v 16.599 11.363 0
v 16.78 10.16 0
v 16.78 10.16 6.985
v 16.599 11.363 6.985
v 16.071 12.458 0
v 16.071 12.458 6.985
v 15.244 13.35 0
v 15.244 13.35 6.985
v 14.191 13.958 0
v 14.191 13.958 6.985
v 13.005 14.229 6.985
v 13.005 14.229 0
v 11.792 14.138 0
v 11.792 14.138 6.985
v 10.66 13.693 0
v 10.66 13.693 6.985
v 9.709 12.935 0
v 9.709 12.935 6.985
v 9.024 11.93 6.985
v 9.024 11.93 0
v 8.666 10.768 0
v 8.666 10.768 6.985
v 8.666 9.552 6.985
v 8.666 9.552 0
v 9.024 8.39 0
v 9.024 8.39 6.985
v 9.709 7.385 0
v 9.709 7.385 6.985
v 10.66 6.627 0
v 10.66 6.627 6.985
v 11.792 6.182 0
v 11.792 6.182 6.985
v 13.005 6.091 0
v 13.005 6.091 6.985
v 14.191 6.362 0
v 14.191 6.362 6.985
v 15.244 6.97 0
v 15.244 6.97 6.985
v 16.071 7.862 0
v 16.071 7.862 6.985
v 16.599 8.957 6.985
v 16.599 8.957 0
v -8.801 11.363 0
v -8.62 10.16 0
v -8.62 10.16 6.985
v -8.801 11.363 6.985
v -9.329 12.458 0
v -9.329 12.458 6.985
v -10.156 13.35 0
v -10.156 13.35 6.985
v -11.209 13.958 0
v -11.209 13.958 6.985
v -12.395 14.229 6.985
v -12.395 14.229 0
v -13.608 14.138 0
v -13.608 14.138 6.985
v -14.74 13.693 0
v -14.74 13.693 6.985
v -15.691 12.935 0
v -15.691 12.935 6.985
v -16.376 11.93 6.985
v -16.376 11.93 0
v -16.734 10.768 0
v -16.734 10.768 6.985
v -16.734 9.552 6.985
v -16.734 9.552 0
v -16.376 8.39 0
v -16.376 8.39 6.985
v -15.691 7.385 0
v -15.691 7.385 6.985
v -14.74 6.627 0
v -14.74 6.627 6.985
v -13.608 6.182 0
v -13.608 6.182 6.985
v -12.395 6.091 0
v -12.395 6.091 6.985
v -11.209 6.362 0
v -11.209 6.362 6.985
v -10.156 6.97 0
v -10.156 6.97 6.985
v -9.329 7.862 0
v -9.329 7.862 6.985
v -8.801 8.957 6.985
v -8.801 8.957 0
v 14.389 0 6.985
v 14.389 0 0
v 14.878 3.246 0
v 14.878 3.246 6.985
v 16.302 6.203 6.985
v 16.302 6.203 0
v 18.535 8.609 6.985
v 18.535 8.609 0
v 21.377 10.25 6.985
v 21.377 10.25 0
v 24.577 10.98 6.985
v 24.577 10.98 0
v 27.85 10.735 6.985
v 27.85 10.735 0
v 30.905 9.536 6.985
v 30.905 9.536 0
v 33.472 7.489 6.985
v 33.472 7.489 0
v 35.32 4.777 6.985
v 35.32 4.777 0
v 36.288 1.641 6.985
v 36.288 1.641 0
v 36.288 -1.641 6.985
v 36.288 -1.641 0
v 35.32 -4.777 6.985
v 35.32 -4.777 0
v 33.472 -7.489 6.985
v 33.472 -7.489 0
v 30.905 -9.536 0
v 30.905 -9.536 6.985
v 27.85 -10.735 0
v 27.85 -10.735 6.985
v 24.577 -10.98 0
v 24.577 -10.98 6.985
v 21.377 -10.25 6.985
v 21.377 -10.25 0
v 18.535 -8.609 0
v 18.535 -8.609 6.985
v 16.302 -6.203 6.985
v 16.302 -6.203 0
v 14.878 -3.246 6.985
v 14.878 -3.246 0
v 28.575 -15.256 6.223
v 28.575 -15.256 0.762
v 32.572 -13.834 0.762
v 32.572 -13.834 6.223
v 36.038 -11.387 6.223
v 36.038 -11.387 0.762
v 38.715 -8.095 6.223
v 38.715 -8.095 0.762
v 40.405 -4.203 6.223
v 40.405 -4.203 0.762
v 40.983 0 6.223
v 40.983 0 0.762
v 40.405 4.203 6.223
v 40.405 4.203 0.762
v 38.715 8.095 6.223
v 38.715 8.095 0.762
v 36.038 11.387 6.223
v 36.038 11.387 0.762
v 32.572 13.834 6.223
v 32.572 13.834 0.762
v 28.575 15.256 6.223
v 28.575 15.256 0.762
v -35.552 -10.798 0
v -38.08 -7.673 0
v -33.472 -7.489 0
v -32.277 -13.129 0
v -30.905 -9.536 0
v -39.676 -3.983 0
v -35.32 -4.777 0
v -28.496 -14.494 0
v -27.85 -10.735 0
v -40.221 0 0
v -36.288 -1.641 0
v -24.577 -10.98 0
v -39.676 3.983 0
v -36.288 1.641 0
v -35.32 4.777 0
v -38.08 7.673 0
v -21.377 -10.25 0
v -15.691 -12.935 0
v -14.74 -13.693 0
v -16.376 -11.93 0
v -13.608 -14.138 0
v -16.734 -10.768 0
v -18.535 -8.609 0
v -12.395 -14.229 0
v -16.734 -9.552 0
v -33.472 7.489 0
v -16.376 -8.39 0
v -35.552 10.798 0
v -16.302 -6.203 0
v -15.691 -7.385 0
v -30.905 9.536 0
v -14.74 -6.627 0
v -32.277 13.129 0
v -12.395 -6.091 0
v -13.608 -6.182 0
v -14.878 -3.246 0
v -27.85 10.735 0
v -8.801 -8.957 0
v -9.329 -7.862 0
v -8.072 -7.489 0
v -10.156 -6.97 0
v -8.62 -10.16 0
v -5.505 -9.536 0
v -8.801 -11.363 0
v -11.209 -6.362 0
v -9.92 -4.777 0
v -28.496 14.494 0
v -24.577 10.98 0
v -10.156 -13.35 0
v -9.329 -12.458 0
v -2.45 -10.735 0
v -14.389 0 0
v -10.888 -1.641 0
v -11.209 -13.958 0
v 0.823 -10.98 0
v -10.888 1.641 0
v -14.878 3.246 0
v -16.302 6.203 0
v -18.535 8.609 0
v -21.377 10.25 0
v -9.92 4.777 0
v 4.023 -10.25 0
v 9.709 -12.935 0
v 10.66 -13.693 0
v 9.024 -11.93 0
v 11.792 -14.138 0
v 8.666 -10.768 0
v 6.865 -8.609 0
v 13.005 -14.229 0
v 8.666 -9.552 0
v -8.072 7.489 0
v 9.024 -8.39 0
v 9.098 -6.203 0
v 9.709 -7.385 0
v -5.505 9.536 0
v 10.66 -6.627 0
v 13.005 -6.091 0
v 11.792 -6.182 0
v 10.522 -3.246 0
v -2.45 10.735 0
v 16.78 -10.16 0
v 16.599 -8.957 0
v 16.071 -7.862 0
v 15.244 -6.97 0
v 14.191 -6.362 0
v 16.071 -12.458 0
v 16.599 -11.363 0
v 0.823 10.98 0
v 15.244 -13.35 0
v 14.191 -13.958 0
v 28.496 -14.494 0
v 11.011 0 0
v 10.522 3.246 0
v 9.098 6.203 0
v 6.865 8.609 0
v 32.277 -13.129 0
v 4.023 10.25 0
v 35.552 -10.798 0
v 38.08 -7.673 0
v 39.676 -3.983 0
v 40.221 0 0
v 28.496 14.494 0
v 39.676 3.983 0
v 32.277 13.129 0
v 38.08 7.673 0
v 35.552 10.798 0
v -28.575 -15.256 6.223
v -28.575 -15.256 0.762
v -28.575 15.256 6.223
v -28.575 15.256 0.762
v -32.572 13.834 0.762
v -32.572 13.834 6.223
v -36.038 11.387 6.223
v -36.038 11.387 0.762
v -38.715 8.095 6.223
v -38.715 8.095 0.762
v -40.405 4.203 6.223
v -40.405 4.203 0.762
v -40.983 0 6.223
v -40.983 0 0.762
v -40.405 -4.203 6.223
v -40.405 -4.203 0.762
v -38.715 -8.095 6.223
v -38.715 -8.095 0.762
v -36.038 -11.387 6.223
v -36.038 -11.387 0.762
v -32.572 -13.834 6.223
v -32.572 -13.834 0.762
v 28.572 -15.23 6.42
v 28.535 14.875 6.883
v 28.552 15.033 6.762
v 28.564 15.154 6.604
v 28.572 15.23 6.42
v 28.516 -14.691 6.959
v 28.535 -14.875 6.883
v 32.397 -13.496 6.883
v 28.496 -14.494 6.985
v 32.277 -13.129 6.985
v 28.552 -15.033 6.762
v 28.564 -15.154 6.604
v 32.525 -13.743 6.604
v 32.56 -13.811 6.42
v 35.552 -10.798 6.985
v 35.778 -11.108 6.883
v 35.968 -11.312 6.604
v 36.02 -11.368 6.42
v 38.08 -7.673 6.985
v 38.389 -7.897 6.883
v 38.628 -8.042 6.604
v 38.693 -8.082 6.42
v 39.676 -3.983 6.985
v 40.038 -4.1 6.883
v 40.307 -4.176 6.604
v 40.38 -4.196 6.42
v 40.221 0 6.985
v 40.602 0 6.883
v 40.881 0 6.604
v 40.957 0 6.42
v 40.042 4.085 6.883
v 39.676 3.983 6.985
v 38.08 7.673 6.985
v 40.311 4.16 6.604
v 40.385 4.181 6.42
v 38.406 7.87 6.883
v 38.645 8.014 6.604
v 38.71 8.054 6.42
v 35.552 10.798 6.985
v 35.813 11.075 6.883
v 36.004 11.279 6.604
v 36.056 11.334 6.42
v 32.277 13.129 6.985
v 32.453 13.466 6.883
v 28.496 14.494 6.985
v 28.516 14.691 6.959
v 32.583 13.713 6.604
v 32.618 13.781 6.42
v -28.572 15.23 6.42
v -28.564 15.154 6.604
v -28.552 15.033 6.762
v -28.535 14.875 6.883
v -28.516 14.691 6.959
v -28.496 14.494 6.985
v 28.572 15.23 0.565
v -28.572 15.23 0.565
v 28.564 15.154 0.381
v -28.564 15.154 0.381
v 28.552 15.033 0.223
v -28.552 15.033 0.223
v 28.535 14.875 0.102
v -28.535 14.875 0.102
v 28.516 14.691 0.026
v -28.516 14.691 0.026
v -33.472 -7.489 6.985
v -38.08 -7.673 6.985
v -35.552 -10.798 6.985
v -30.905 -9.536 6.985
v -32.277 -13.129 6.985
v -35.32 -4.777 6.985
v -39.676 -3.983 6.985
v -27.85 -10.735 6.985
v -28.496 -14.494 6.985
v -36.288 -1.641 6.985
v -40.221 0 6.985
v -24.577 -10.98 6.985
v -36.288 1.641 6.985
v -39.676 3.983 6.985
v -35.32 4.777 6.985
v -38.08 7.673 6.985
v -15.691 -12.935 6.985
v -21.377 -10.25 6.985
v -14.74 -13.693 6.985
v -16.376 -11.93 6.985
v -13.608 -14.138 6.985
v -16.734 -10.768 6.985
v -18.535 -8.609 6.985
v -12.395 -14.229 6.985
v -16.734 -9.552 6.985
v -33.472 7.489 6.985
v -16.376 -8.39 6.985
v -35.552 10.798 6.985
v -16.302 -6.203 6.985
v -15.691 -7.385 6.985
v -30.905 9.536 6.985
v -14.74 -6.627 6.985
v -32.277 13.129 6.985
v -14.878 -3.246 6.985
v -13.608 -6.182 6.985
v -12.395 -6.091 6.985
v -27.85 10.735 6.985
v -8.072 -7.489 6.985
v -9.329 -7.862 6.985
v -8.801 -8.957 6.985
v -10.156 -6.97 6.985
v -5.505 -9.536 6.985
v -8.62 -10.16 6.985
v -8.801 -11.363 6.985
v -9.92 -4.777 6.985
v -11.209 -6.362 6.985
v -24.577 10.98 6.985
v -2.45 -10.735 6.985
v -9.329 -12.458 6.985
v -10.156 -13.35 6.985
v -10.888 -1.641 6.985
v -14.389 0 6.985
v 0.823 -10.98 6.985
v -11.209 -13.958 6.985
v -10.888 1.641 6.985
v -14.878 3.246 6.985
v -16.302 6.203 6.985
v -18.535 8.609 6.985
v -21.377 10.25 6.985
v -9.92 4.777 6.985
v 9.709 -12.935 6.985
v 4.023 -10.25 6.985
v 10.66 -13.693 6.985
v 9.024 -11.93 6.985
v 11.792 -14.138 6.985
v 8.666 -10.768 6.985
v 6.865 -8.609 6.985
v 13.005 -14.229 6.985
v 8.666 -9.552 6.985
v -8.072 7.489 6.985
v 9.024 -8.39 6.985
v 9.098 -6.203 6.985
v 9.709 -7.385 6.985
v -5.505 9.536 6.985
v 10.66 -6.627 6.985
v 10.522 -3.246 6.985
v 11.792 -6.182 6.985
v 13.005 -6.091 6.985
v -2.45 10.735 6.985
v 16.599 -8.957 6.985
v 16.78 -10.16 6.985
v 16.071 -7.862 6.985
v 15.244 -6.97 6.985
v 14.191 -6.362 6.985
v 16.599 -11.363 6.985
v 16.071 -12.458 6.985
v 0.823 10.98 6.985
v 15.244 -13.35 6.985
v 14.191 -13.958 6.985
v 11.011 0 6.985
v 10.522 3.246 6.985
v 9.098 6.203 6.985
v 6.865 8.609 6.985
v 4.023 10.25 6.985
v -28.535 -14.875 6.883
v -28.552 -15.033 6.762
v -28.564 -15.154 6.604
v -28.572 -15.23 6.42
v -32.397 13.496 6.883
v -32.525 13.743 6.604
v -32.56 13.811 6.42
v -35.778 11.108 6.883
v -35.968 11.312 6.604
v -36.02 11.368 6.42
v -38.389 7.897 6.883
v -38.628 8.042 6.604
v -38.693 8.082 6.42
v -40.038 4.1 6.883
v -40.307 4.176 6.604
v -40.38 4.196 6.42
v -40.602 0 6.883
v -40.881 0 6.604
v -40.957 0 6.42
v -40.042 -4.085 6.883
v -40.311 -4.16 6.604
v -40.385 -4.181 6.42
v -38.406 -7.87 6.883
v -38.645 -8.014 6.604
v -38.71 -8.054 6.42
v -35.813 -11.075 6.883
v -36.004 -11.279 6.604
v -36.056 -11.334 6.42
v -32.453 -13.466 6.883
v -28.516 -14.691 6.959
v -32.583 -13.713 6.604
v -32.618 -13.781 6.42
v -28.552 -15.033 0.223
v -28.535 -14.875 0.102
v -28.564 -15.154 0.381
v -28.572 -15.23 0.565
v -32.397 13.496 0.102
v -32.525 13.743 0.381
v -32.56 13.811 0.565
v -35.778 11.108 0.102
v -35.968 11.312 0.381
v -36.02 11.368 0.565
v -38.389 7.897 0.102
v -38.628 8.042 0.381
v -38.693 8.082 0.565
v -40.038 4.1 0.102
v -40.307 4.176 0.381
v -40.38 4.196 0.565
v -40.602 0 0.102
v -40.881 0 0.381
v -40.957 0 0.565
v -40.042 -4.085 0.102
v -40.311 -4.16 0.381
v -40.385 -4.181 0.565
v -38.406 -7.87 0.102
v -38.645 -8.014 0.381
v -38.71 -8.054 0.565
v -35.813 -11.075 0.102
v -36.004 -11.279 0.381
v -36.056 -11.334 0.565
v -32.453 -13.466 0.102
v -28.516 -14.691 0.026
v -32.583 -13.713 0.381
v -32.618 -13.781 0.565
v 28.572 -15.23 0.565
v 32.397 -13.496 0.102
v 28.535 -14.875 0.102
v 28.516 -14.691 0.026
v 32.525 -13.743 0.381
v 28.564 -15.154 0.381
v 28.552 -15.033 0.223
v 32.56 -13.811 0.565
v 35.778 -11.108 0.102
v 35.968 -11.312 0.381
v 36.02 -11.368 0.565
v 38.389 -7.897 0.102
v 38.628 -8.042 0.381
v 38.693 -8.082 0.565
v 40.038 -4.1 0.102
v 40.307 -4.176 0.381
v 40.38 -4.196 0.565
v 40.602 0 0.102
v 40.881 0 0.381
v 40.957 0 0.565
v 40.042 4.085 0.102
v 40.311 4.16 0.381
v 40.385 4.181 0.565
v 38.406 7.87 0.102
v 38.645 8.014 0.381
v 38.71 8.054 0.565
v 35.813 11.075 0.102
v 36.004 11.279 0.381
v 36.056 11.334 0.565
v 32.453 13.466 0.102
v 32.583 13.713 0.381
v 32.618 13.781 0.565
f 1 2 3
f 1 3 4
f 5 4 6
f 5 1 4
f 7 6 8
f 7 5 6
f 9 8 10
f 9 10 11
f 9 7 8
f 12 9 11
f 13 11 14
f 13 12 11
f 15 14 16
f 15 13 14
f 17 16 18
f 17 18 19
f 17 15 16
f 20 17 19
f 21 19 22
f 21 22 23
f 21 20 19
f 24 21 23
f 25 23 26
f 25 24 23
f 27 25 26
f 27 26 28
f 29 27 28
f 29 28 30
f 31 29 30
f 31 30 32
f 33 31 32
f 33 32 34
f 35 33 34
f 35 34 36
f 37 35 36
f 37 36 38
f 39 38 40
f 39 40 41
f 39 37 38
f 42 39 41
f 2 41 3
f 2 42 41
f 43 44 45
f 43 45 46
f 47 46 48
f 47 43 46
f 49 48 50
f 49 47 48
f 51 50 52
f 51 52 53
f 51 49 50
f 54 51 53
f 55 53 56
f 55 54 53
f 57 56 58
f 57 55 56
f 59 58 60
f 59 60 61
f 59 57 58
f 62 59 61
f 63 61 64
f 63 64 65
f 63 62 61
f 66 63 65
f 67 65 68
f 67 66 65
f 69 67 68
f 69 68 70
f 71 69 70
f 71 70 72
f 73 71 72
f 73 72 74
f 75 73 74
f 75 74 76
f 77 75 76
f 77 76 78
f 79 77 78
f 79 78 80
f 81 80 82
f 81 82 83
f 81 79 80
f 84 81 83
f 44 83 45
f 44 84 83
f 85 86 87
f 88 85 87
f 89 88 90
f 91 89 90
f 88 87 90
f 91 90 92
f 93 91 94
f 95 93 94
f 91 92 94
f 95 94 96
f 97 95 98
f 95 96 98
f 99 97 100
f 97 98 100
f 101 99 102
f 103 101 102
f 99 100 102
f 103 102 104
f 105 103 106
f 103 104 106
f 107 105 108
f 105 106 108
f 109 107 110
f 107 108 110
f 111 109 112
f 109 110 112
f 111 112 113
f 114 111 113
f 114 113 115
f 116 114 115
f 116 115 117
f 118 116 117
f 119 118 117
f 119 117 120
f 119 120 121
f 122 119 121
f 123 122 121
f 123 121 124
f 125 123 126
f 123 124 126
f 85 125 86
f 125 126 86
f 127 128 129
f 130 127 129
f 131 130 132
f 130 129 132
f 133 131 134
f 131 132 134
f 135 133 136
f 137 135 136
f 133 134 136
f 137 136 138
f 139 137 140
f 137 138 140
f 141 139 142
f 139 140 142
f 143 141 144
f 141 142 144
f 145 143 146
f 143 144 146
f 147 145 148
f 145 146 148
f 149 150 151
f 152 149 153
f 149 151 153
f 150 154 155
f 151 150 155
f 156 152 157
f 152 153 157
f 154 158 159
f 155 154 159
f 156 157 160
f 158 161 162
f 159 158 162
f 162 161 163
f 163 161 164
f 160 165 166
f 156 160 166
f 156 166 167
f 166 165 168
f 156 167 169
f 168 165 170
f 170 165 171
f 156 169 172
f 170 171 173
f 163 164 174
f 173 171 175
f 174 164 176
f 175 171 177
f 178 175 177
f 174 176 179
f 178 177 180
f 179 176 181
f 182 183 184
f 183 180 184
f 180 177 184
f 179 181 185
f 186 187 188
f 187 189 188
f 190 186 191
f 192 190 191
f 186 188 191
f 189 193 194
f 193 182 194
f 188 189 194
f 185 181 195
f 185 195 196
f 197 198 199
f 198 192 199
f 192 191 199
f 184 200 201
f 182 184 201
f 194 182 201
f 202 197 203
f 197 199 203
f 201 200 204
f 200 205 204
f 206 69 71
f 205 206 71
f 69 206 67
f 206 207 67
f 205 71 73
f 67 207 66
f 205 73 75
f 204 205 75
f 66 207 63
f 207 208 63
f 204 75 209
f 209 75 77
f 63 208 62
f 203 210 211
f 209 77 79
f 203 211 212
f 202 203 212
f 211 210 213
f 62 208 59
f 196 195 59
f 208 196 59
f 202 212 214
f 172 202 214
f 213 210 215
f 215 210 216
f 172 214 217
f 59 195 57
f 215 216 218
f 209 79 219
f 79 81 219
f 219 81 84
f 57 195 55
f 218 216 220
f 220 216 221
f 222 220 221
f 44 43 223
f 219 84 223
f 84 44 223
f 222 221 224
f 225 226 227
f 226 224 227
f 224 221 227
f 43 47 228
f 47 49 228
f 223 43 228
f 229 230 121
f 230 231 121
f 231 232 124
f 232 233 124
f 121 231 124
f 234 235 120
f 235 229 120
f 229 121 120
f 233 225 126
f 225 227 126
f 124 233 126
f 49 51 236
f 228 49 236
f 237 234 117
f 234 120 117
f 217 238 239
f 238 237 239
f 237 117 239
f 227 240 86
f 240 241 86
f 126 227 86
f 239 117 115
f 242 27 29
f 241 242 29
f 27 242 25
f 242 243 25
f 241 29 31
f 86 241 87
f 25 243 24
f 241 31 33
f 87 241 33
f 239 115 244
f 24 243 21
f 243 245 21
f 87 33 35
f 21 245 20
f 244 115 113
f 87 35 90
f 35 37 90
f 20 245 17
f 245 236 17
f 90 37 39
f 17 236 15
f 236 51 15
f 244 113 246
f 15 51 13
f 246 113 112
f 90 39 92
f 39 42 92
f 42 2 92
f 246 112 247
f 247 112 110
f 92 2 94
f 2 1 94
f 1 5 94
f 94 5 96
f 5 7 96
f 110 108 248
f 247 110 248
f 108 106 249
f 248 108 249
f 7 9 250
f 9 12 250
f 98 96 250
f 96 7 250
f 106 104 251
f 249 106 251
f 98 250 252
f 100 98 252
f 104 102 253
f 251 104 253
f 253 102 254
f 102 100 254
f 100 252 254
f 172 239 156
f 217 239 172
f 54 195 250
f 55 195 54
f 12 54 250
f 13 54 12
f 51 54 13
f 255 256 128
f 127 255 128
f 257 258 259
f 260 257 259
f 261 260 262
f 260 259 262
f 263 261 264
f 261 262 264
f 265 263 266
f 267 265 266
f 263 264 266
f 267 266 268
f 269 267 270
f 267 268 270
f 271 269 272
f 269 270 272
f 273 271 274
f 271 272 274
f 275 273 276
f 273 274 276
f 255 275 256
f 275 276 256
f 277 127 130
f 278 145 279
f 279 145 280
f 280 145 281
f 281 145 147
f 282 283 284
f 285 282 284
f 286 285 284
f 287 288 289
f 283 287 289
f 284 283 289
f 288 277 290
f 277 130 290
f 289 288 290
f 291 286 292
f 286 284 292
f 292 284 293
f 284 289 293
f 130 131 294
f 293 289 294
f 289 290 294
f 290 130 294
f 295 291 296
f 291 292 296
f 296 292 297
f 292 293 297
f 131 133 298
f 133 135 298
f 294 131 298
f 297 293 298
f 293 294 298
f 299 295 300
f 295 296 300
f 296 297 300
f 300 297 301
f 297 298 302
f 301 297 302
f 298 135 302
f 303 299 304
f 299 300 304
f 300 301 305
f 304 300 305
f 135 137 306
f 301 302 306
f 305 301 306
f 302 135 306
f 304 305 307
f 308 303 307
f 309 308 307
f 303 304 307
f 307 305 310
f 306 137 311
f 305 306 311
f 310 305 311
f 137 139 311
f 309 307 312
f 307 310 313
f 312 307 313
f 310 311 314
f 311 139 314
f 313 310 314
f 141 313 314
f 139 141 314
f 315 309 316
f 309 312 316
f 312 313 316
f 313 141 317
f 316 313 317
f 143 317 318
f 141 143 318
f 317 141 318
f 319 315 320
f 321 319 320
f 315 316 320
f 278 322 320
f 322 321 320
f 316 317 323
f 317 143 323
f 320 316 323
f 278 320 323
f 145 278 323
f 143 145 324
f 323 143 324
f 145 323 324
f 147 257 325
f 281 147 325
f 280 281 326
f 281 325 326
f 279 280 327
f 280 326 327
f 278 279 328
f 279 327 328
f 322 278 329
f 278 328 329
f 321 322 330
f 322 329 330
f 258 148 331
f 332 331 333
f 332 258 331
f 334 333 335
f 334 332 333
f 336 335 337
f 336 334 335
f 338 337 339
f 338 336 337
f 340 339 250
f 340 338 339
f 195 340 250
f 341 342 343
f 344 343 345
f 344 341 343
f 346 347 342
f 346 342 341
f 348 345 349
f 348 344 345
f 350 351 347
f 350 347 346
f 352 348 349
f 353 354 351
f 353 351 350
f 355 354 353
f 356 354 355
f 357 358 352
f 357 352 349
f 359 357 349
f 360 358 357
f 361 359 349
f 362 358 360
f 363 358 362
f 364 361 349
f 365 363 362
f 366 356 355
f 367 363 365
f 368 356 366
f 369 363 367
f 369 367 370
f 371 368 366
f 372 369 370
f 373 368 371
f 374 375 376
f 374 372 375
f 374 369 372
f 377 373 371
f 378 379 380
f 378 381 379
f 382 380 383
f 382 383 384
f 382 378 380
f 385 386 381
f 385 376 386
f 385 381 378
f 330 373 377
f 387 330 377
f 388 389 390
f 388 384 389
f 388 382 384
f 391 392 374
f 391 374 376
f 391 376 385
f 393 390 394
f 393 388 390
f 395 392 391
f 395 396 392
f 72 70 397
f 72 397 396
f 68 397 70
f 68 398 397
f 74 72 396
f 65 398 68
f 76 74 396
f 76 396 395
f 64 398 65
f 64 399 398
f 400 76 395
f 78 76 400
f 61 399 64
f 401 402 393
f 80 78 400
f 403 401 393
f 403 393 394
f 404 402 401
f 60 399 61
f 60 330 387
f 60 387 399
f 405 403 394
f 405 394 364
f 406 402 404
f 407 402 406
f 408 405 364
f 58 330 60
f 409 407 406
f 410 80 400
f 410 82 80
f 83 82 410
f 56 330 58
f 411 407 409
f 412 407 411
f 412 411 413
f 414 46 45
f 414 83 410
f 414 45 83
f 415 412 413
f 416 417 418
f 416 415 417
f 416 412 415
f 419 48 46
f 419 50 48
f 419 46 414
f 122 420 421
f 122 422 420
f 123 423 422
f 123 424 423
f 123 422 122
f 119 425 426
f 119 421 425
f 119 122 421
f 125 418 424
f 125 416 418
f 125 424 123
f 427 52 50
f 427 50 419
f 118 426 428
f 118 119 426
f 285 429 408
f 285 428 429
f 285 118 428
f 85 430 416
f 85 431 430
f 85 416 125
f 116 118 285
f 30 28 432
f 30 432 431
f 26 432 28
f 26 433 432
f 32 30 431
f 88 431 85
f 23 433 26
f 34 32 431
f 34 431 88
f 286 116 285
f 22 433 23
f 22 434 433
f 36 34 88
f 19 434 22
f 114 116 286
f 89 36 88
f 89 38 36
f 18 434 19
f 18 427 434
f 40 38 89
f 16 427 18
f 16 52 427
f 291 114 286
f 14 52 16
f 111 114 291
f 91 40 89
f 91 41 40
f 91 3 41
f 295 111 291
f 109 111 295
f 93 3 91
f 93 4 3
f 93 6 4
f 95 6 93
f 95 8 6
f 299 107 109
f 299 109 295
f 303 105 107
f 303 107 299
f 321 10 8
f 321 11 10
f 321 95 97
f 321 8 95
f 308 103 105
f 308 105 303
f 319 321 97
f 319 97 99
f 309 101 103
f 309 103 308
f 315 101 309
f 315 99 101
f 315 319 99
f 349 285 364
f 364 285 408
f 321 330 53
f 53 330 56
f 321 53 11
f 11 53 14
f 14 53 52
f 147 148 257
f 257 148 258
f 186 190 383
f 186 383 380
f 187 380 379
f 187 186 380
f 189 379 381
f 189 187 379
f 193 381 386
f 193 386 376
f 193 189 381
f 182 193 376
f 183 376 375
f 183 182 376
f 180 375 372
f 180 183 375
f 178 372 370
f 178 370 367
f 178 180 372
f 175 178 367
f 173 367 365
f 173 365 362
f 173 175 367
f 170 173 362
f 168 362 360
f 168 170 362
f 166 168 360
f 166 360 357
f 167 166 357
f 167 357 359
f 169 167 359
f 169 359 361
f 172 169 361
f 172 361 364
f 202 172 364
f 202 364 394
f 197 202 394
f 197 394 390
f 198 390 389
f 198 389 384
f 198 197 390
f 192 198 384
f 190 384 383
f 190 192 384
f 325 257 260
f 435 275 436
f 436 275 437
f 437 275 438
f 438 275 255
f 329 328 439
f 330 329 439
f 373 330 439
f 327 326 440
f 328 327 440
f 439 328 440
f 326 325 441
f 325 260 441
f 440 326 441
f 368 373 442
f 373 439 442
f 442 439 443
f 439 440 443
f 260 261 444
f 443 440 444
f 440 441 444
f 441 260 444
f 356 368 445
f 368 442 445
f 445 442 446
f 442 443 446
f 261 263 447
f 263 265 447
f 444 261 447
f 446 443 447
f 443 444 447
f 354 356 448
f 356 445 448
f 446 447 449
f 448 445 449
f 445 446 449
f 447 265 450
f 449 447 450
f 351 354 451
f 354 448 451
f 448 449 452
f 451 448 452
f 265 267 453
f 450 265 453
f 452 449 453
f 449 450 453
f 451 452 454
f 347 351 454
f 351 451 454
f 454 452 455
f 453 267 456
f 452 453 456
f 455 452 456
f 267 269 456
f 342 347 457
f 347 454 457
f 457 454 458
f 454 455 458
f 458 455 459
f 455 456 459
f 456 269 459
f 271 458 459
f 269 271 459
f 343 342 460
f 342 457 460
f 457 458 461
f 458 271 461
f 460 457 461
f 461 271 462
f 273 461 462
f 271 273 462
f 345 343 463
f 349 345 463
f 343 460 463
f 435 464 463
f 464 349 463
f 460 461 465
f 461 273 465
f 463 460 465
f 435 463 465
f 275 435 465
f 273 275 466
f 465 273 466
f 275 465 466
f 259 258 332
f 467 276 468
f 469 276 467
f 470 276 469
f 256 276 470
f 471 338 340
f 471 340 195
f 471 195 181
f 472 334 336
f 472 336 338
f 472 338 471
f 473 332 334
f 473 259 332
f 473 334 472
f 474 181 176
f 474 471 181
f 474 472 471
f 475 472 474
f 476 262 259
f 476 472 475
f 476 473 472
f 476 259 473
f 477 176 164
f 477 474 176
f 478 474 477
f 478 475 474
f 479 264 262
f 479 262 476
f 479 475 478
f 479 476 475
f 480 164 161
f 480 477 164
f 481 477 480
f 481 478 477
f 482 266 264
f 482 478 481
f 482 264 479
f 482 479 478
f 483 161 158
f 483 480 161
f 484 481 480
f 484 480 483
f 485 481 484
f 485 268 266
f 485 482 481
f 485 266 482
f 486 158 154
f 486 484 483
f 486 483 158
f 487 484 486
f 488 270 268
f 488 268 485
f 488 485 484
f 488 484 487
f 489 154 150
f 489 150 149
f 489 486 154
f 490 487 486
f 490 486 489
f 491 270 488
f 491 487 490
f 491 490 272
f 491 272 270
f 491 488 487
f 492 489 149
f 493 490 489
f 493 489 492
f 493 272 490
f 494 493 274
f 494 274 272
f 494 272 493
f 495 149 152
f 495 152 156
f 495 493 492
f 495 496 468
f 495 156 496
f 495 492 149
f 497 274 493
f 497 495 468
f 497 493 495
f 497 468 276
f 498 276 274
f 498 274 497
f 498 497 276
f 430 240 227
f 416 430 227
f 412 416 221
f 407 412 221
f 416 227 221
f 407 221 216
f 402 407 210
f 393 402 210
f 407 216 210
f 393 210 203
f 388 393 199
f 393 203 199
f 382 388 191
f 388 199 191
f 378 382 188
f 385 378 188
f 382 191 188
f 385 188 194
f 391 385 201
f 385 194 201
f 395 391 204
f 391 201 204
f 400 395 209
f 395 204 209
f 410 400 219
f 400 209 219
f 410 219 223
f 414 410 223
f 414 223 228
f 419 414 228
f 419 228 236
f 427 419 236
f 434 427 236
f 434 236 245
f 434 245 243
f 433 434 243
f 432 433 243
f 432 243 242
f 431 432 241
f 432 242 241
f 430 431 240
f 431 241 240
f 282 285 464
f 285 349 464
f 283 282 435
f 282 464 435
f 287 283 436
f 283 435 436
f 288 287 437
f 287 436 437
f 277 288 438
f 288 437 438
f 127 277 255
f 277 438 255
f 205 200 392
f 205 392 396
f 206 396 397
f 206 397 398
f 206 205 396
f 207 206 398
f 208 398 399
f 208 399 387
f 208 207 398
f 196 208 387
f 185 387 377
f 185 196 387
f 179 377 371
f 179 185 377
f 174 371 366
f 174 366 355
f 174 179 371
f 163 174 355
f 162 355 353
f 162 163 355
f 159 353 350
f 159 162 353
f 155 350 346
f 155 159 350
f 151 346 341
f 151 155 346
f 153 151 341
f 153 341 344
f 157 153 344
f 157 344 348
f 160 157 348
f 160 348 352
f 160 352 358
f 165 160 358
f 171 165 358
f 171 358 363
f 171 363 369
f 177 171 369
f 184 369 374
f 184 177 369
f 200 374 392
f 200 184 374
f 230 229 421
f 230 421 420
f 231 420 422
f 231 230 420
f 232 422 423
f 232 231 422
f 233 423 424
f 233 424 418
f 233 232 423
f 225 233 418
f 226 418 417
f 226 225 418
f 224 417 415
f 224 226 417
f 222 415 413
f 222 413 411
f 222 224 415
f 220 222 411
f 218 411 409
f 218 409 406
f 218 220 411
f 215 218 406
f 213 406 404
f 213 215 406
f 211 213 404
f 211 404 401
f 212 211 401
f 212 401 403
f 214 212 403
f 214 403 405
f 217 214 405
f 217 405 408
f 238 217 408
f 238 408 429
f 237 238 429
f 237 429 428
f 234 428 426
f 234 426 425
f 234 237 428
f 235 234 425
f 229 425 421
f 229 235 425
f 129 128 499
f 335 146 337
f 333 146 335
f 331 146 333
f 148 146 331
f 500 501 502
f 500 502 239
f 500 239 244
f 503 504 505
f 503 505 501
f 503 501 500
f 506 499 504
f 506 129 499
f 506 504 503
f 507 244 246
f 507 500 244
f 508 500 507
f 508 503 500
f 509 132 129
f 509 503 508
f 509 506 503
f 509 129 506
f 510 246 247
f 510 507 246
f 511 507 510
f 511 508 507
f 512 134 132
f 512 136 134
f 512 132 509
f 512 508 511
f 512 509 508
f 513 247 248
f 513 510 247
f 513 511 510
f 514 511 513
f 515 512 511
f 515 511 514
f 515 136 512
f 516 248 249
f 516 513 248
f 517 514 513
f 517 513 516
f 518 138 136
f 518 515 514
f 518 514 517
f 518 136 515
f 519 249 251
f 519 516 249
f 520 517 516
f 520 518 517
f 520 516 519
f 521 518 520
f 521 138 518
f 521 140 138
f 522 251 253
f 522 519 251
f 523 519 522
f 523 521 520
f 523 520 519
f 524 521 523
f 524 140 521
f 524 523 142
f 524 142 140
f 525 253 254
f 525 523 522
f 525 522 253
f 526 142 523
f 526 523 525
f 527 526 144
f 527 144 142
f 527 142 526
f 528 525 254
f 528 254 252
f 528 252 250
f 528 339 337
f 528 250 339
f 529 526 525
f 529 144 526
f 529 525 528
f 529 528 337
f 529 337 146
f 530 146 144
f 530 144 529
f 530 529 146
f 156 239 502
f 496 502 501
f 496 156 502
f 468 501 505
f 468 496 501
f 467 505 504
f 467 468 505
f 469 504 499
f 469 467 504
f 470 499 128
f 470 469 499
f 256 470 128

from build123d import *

# Parameters (mm, degrees)
F0_R        = 4.0800200383
F0_R_2      = 11.0109
F1_DEPTH    = 6.985
F2_T1_DEPTH = 63.627
F2_T4_ANGLE = 170.5132200492
F2_T6_ANGLE = 170.5132200492
F3_T1_DEPTH = 63.627
F3_T4_ANGLE = 170.5132200492
F3_T6_ANGLE = 170.5132200492


# Not quite as in the source:
# - a fillet or chamfer that OpenCascade refuses, or shapes differently, is made with other operations: its cross-section is extruded or revolved along the edge and cut away or added


with BuildPart() as f1:
    # F0 (on Top) → F1 (new body)
    with BuildSketch(Plane.XY):
        with BuildLine():
            Line((28.575, 15.2560200383), (-28.575, 15.2560200383))
            ThreePointArc((-28.575, 15.2560200383), (-40.9829, 0), (-28.575, -15.2560200383))
            Line((-28.575, -15.2560200383), (28.575, -15.2560200383))
            ThreePointArc((28.575, -15.2560200383), (40.9829, 0), (28.575, 15.2560200383))
        make_face()
        with Locations((-12.7, -10.16)):
            Circle(F0_R, mode=Mode.SUBTRACT)
        with Locations((12.7, -10.16)):
            Circle(F0_R, mode=Mode.SUBTRACT)
        with Locations((-25.4, 0)):
            Circle(F0_R_2, mode=Mode.SUBTRACT)
        with Locations((-12.7, 10.16)):
            Circle(F0_R, mode=Mode.SUBTRACT)
        with BuildLine():
            ThreePointArc((-11.0109, 0), (0, 11.0109), (11.0109, 0))
            ThreePointArc((11.0109, 0), (0, -11.0109), (-11.0109, 0))
        make_face(mode=Mode.SUBTRACT)
        with BuildLine():
            ThreePointArc((36.4109, 0), (25.4, -11.0109), (14.3891, 0))
            ThreePointArc((14.3891, 0), (25.4, 11.0109), (36.4109, 0))
        make_face(mode=Mode.SUBTRACT)
        with Locations((12.7, 10.16)):
            Circle(F0_R, mode=Mode.SUBTRACT)
    extrude(amount=F1_DEPTH)

    # F2: fillet of radius 0.762 on 4 edges, made by hand

    # F2_s2 → F2_t1 (cut)
    with BuildSketch(Plane.YZ.offset(-31.8135)):
        with BuildLine():
            ThreePointArc((-14.4940200383, 6.985), (-15.0328354056, 6.7618153673), (-15.2560200383, 6.223))
            Line((-15.2560200383, 6.223), (-15.2560200383, 6.985))
            Line((-15.2560200383, 6.985), (-14.4940200383, 6.985))
        make_face()
        with BuildLine():
            ThreePointArc((15.2560200383, 6.223), (15.0328354056, 6.7618153673), (14.4940200383, 6.985))
            Line((14.4940200383, 6.985), (15.2560200383, 6.985))
            Line((15.2560200383, 6.985), (15.2560200383, 6.223))
        make_face()
    extrude(amount=F2_T1_DEPTH, mode=Mode.SUBTRACT)

    # F2_s3 → F2_t4 (revolve, cut)
    with BuildSketch(Plane(origin=(-25.2263104474, -2.0932144122, 0), x_dir=(0, 0, 1), z_dir=(0.9965750492, 0.0826932365, 0))):
        with BuildLine():
            ThreePointArc((6.985, -16.921308207), (6.7618153673, -17.4601235742), (6.223, -17.683308207))
            Line((6.223, -17.683308207), (6.985, -17.683308207))
            Line((6.985, -17.683308207), (6.985, -16.921308207))
        make_face()
    revolve(axis=Axis((-25.4, 0, 6.985), (0, 0, 1)), revolution_arc=F2_T4_ANGLE, mode=Mode.SUBTRACT)

    # F2_s5 → F2_t6 (revolve, cut)
    with BuildSketch(Plane(origin=(25.2263104474, 2.0932144122, 0), x_dir=(0, 0, 1), z_dir=(-0.9965750492, -0.0826932365, 0))):
        with BuildLine():
            ThreePointArc((6.985, -16.921308207), (6.7618153673, -17.4601235742), (6.223, -17.683308207))
            Line((6.223, -17.683308207), (6.985, -17.683308207))
            Line((6.985, -17.683308207), (6.985, -16.921308207))
        make_face()
    revolve(axis=Axis((25.4, 0, 6.985), (0, 0, 1)), revolution_arc=F2_T6_ANGLE, mode=Mode.SUBTRACT)

    # F3: fillet of radius 0.762 on 4 edges, made by hand

    # F3_s2 → F3_t1 (cut)
    with BuildSketch(Plane.YZ.offset(-31.8135)):
        with BuildLine():
            ThreePointArc((15.2560200383, 0.762), (15.0328354056, 0.2231846327), (14.4940200383, 0))
            Line((14.4940200383, 0), (15.2560200383, 0))
            Line((15.2560200383, 0), (15.2560200383, 0.762))
        make_face()
        with BuildLine():
            ThreePointArc((-14.4940200383, 0), (-15.0328354056, 0.2231846327), (-15.2560200383, 0.762))
            Line((-15.2560200383, 0.762), (-15.2560200383, 0))
            Line((-15.2560200383, 0), (-14.4940200383, 0))
        make_face()
    extrude(amount=F3_T1_DEPTH, mode=Mode.SUBTRACT)

    # F3_s3 → F3_t4 (revolve, cut)
    with BuildSketch(Plane(origin=(-25.2263104474, -2.0932144122, 0), x_dir=(0, 0, 1), z_dir=(0.9965750492, 0.0826932365, 0))):
        with BuildLine():
            ThreePointArc((0, -16.921308207), (0.2231846327, -17.4601235742), (0.762, -17.683308207))
            Line((0.762, -17.683308207), (0, -17.683308207))
            Line((0, -17.683308207), (0, -16.921308207))
        make_face()
    revolve(axis=Axis((-25.4, 0, 0), (0, 0, 1)), revolution_arc=F3_T4_ANGLE, mode=Mode.SUBTRACT)

    # F3_s5 → F3_t6 (revolve, cut)
    with BuildSketch(Plane(origin=(25.2263104474, 2.0932144122, 0), x_dir=(0, 0, 1), z_dir=(-0.9965750492, -0.0826932365, 0))):
        with BuildLine():
            ThreePointArc((0, -16.921308207), (0.2231846327, -17.4601235742), (0.762, -17.683308207))
            Line((0.762, -17.683308207), (0, -17.683308207))
            Line((0, -17.683308207), (0, -16.921308207))
        make_face()
    revolve(axis=Axis((25.4, 0, 0), (0, 0, 1)), revolution_arc=F3_T6_ANGLE, mode=Mode.SUBTRACT)


solid = f1.part
